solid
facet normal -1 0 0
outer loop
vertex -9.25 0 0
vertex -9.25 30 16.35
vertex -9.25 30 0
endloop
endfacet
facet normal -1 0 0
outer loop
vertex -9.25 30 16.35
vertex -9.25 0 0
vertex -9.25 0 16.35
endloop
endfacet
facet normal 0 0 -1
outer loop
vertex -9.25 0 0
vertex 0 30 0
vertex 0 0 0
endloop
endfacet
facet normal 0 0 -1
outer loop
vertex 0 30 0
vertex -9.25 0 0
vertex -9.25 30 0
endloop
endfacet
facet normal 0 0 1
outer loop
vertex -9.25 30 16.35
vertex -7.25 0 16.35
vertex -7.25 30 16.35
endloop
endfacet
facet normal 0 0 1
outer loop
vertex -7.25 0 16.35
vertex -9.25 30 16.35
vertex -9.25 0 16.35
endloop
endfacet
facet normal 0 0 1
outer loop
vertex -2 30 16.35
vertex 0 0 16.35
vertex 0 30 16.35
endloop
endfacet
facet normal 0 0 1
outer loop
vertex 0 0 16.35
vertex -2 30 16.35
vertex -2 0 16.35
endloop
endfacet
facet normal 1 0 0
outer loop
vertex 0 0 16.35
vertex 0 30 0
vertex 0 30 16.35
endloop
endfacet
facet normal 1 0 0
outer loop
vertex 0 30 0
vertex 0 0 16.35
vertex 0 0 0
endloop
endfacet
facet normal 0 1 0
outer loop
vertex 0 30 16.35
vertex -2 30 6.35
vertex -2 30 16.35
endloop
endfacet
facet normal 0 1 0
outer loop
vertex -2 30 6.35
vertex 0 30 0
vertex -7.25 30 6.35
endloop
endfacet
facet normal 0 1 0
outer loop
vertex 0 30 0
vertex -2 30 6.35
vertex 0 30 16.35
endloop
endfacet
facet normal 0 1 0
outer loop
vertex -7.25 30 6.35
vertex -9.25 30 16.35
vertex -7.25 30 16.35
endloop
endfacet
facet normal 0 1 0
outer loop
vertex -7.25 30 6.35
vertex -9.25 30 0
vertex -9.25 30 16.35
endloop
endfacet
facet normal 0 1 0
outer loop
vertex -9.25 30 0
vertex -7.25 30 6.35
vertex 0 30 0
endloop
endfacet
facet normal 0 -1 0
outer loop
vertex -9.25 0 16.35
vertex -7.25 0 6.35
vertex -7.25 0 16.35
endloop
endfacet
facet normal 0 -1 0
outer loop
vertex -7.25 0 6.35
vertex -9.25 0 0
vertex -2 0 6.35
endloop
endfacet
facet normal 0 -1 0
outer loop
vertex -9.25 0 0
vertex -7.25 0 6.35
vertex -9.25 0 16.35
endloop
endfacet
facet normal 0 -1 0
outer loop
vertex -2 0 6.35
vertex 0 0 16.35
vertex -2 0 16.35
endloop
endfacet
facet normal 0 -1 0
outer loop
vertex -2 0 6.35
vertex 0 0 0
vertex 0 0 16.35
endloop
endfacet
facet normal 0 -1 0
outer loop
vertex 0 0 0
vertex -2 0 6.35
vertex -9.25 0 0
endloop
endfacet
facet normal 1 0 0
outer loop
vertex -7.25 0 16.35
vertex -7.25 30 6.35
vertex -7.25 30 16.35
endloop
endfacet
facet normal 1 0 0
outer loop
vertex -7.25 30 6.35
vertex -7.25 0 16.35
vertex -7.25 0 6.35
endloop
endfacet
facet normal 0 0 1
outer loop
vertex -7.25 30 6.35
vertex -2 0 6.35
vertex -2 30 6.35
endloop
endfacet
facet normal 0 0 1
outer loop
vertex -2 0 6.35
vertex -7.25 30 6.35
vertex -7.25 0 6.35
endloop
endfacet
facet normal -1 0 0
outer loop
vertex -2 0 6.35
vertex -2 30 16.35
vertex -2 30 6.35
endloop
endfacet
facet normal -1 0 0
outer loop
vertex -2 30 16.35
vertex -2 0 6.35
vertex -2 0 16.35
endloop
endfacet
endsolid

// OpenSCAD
//
//    FlashForgetCreater Dual z stop adjuster
//
//    EvilTeach
//
//    12/25/2015
//

// The actual thickness of the piece of glass.
glassPlateThickness = 6.35;     // .25 inches
// glassPlateThickness = 5.08;     // .20 inches
// glassPlateThickness = 2.33;     // My piece of glass


// This is the thickness of the piece of wood that the part slips over as measured on my machine
woodThickness       = 5.25;


module main()
{
    wallThickness       = 2.00;

    width =  wallThickness + woodThickness + wallThickness;
    depth =  30;
    height = glassPlateThickness + 10.0;
    
    // Move the piece onto the build plate
    translate([0, 0, height])
        // Turn it upside down so no support material is needed
        rotate([0, 180, 0])
            difference()
            {
                // Draw a cube big enough to fit over the wood
                cube([width, depth, height]);
                // Offset into the middle of the block
                translate([wallThickness, 0, 0])
                    // Cut out the block that fits over the wood
                    cube([width - wallThickness - wallThickness, 
                          depth, 
                          height - glassPlateThickness]);
            }
}

main();
